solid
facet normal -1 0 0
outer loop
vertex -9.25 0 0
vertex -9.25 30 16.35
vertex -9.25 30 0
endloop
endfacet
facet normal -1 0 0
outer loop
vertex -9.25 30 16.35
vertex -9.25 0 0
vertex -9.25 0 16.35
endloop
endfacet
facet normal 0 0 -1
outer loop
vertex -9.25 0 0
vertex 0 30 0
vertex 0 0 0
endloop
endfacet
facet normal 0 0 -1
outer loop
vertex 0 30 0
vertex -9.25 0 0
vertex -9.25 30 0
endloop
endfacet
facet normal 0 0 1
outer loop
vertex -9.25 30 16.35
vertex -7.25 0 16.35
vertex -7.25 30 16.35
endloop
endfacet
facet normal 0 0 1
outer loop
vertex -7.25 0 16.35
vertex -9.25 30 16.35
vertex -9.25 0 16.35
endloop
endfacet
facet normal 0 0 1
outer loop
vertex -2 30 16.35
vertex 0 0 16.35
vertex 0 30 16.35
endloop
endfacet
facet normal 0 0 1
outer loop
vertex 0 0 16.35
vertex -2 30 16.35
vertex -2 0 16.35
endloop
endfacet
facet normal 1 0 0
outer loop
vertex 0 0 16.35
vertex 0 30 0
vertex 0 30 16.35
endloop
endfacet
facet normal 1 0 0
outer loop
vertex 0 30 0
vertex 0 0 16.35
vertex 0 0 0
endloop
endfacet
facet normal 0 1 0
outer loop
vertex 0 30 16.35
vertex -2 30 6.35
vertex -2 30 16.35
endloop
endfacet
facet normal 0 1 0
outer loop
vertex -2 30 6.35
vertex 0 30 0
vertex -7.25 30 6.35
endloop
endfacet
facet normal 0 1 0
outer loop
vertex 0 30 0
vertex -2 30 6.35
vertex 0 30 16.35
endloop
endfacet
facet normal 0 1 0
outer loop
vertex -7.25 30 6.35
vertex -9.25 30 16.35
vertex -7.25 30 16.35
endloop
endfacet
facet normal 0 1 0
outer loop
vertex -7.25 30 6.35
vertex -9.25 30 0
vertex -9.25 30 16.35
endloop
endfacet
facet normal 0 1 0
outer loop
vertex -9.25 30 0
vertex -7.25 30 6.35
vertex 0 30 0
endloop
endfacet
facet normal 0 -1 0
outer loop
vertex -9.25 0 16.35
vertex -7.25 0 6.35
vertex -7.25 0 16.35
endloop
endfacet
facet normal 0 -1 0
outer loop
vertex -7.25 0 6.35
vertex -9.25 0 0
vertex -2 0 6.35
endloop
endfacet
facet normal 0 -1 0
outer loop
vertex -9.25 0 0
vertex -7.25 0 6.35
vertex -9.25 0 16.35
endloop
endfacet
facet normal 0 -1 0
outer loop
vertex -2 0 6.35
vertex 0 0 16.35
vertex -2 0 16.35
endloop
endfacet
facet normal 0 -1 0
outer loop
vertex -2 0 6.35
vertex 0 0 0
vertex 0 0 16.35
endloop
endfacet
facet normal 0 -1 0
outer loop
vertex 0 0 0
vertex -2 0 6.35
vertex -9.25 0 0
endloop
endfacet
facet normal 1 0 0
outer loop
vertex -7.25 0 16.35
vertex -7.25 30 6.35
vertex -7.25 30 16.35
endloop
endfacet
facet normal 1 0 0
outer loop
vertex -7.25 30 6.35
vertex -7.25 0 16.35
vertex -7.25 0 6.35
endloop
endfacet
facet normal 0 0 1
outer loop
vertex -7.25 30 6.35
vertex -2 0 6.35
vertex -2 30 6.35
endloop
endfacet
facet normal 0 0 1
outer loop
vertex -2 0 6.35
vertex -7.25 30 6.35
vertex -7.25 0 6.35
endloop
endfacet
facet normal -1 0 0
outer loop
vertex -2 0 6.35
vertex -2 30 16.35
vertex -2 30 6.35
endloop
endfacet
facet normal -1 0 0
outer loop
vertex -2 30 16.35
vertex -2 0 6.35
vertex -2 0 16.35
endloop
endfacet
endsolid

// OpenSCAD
//
//    FlashForgetCreater Dual z stop adjuster
//
//    EvilTeach
//
//    12/25/2015
//

// The actual thickness of the piece of glass.
glassPlateThickness = 6.35;     // .25 inches
// glassPlateThickness = 5.08;     // .20 inches
// glassPlateThickness = 2.33;     // My piece of glass


// This is the thickness of the piece of wood that the part slips over as measured on my machine
woodThickness       = 5.25;


module main()
{
    wallThickness       = 2.00;

    width =  wallThickness + woodThickness + wallThickness;
    depth =  30;
    height = glassPlateThickness + 10.0;
    
    // Move the piece onto the build plate
    translate([0, 0, height])
        // Turn it upside down so no support material is needed
        rotate([0, 180, 0])
            difference()
            {
                // Draw a cube big enough to fit over the wood
                cube([width, depth, height]);
                // Offset into the middle of the block
                translate([wallThickness, 0, 0])
                    // Cut out the block that fits over the wood
                    cube([width - wallThickness - wallThickness, 
                          depth, 
                          height - glassPlateThickness]);
            }
}

main();
